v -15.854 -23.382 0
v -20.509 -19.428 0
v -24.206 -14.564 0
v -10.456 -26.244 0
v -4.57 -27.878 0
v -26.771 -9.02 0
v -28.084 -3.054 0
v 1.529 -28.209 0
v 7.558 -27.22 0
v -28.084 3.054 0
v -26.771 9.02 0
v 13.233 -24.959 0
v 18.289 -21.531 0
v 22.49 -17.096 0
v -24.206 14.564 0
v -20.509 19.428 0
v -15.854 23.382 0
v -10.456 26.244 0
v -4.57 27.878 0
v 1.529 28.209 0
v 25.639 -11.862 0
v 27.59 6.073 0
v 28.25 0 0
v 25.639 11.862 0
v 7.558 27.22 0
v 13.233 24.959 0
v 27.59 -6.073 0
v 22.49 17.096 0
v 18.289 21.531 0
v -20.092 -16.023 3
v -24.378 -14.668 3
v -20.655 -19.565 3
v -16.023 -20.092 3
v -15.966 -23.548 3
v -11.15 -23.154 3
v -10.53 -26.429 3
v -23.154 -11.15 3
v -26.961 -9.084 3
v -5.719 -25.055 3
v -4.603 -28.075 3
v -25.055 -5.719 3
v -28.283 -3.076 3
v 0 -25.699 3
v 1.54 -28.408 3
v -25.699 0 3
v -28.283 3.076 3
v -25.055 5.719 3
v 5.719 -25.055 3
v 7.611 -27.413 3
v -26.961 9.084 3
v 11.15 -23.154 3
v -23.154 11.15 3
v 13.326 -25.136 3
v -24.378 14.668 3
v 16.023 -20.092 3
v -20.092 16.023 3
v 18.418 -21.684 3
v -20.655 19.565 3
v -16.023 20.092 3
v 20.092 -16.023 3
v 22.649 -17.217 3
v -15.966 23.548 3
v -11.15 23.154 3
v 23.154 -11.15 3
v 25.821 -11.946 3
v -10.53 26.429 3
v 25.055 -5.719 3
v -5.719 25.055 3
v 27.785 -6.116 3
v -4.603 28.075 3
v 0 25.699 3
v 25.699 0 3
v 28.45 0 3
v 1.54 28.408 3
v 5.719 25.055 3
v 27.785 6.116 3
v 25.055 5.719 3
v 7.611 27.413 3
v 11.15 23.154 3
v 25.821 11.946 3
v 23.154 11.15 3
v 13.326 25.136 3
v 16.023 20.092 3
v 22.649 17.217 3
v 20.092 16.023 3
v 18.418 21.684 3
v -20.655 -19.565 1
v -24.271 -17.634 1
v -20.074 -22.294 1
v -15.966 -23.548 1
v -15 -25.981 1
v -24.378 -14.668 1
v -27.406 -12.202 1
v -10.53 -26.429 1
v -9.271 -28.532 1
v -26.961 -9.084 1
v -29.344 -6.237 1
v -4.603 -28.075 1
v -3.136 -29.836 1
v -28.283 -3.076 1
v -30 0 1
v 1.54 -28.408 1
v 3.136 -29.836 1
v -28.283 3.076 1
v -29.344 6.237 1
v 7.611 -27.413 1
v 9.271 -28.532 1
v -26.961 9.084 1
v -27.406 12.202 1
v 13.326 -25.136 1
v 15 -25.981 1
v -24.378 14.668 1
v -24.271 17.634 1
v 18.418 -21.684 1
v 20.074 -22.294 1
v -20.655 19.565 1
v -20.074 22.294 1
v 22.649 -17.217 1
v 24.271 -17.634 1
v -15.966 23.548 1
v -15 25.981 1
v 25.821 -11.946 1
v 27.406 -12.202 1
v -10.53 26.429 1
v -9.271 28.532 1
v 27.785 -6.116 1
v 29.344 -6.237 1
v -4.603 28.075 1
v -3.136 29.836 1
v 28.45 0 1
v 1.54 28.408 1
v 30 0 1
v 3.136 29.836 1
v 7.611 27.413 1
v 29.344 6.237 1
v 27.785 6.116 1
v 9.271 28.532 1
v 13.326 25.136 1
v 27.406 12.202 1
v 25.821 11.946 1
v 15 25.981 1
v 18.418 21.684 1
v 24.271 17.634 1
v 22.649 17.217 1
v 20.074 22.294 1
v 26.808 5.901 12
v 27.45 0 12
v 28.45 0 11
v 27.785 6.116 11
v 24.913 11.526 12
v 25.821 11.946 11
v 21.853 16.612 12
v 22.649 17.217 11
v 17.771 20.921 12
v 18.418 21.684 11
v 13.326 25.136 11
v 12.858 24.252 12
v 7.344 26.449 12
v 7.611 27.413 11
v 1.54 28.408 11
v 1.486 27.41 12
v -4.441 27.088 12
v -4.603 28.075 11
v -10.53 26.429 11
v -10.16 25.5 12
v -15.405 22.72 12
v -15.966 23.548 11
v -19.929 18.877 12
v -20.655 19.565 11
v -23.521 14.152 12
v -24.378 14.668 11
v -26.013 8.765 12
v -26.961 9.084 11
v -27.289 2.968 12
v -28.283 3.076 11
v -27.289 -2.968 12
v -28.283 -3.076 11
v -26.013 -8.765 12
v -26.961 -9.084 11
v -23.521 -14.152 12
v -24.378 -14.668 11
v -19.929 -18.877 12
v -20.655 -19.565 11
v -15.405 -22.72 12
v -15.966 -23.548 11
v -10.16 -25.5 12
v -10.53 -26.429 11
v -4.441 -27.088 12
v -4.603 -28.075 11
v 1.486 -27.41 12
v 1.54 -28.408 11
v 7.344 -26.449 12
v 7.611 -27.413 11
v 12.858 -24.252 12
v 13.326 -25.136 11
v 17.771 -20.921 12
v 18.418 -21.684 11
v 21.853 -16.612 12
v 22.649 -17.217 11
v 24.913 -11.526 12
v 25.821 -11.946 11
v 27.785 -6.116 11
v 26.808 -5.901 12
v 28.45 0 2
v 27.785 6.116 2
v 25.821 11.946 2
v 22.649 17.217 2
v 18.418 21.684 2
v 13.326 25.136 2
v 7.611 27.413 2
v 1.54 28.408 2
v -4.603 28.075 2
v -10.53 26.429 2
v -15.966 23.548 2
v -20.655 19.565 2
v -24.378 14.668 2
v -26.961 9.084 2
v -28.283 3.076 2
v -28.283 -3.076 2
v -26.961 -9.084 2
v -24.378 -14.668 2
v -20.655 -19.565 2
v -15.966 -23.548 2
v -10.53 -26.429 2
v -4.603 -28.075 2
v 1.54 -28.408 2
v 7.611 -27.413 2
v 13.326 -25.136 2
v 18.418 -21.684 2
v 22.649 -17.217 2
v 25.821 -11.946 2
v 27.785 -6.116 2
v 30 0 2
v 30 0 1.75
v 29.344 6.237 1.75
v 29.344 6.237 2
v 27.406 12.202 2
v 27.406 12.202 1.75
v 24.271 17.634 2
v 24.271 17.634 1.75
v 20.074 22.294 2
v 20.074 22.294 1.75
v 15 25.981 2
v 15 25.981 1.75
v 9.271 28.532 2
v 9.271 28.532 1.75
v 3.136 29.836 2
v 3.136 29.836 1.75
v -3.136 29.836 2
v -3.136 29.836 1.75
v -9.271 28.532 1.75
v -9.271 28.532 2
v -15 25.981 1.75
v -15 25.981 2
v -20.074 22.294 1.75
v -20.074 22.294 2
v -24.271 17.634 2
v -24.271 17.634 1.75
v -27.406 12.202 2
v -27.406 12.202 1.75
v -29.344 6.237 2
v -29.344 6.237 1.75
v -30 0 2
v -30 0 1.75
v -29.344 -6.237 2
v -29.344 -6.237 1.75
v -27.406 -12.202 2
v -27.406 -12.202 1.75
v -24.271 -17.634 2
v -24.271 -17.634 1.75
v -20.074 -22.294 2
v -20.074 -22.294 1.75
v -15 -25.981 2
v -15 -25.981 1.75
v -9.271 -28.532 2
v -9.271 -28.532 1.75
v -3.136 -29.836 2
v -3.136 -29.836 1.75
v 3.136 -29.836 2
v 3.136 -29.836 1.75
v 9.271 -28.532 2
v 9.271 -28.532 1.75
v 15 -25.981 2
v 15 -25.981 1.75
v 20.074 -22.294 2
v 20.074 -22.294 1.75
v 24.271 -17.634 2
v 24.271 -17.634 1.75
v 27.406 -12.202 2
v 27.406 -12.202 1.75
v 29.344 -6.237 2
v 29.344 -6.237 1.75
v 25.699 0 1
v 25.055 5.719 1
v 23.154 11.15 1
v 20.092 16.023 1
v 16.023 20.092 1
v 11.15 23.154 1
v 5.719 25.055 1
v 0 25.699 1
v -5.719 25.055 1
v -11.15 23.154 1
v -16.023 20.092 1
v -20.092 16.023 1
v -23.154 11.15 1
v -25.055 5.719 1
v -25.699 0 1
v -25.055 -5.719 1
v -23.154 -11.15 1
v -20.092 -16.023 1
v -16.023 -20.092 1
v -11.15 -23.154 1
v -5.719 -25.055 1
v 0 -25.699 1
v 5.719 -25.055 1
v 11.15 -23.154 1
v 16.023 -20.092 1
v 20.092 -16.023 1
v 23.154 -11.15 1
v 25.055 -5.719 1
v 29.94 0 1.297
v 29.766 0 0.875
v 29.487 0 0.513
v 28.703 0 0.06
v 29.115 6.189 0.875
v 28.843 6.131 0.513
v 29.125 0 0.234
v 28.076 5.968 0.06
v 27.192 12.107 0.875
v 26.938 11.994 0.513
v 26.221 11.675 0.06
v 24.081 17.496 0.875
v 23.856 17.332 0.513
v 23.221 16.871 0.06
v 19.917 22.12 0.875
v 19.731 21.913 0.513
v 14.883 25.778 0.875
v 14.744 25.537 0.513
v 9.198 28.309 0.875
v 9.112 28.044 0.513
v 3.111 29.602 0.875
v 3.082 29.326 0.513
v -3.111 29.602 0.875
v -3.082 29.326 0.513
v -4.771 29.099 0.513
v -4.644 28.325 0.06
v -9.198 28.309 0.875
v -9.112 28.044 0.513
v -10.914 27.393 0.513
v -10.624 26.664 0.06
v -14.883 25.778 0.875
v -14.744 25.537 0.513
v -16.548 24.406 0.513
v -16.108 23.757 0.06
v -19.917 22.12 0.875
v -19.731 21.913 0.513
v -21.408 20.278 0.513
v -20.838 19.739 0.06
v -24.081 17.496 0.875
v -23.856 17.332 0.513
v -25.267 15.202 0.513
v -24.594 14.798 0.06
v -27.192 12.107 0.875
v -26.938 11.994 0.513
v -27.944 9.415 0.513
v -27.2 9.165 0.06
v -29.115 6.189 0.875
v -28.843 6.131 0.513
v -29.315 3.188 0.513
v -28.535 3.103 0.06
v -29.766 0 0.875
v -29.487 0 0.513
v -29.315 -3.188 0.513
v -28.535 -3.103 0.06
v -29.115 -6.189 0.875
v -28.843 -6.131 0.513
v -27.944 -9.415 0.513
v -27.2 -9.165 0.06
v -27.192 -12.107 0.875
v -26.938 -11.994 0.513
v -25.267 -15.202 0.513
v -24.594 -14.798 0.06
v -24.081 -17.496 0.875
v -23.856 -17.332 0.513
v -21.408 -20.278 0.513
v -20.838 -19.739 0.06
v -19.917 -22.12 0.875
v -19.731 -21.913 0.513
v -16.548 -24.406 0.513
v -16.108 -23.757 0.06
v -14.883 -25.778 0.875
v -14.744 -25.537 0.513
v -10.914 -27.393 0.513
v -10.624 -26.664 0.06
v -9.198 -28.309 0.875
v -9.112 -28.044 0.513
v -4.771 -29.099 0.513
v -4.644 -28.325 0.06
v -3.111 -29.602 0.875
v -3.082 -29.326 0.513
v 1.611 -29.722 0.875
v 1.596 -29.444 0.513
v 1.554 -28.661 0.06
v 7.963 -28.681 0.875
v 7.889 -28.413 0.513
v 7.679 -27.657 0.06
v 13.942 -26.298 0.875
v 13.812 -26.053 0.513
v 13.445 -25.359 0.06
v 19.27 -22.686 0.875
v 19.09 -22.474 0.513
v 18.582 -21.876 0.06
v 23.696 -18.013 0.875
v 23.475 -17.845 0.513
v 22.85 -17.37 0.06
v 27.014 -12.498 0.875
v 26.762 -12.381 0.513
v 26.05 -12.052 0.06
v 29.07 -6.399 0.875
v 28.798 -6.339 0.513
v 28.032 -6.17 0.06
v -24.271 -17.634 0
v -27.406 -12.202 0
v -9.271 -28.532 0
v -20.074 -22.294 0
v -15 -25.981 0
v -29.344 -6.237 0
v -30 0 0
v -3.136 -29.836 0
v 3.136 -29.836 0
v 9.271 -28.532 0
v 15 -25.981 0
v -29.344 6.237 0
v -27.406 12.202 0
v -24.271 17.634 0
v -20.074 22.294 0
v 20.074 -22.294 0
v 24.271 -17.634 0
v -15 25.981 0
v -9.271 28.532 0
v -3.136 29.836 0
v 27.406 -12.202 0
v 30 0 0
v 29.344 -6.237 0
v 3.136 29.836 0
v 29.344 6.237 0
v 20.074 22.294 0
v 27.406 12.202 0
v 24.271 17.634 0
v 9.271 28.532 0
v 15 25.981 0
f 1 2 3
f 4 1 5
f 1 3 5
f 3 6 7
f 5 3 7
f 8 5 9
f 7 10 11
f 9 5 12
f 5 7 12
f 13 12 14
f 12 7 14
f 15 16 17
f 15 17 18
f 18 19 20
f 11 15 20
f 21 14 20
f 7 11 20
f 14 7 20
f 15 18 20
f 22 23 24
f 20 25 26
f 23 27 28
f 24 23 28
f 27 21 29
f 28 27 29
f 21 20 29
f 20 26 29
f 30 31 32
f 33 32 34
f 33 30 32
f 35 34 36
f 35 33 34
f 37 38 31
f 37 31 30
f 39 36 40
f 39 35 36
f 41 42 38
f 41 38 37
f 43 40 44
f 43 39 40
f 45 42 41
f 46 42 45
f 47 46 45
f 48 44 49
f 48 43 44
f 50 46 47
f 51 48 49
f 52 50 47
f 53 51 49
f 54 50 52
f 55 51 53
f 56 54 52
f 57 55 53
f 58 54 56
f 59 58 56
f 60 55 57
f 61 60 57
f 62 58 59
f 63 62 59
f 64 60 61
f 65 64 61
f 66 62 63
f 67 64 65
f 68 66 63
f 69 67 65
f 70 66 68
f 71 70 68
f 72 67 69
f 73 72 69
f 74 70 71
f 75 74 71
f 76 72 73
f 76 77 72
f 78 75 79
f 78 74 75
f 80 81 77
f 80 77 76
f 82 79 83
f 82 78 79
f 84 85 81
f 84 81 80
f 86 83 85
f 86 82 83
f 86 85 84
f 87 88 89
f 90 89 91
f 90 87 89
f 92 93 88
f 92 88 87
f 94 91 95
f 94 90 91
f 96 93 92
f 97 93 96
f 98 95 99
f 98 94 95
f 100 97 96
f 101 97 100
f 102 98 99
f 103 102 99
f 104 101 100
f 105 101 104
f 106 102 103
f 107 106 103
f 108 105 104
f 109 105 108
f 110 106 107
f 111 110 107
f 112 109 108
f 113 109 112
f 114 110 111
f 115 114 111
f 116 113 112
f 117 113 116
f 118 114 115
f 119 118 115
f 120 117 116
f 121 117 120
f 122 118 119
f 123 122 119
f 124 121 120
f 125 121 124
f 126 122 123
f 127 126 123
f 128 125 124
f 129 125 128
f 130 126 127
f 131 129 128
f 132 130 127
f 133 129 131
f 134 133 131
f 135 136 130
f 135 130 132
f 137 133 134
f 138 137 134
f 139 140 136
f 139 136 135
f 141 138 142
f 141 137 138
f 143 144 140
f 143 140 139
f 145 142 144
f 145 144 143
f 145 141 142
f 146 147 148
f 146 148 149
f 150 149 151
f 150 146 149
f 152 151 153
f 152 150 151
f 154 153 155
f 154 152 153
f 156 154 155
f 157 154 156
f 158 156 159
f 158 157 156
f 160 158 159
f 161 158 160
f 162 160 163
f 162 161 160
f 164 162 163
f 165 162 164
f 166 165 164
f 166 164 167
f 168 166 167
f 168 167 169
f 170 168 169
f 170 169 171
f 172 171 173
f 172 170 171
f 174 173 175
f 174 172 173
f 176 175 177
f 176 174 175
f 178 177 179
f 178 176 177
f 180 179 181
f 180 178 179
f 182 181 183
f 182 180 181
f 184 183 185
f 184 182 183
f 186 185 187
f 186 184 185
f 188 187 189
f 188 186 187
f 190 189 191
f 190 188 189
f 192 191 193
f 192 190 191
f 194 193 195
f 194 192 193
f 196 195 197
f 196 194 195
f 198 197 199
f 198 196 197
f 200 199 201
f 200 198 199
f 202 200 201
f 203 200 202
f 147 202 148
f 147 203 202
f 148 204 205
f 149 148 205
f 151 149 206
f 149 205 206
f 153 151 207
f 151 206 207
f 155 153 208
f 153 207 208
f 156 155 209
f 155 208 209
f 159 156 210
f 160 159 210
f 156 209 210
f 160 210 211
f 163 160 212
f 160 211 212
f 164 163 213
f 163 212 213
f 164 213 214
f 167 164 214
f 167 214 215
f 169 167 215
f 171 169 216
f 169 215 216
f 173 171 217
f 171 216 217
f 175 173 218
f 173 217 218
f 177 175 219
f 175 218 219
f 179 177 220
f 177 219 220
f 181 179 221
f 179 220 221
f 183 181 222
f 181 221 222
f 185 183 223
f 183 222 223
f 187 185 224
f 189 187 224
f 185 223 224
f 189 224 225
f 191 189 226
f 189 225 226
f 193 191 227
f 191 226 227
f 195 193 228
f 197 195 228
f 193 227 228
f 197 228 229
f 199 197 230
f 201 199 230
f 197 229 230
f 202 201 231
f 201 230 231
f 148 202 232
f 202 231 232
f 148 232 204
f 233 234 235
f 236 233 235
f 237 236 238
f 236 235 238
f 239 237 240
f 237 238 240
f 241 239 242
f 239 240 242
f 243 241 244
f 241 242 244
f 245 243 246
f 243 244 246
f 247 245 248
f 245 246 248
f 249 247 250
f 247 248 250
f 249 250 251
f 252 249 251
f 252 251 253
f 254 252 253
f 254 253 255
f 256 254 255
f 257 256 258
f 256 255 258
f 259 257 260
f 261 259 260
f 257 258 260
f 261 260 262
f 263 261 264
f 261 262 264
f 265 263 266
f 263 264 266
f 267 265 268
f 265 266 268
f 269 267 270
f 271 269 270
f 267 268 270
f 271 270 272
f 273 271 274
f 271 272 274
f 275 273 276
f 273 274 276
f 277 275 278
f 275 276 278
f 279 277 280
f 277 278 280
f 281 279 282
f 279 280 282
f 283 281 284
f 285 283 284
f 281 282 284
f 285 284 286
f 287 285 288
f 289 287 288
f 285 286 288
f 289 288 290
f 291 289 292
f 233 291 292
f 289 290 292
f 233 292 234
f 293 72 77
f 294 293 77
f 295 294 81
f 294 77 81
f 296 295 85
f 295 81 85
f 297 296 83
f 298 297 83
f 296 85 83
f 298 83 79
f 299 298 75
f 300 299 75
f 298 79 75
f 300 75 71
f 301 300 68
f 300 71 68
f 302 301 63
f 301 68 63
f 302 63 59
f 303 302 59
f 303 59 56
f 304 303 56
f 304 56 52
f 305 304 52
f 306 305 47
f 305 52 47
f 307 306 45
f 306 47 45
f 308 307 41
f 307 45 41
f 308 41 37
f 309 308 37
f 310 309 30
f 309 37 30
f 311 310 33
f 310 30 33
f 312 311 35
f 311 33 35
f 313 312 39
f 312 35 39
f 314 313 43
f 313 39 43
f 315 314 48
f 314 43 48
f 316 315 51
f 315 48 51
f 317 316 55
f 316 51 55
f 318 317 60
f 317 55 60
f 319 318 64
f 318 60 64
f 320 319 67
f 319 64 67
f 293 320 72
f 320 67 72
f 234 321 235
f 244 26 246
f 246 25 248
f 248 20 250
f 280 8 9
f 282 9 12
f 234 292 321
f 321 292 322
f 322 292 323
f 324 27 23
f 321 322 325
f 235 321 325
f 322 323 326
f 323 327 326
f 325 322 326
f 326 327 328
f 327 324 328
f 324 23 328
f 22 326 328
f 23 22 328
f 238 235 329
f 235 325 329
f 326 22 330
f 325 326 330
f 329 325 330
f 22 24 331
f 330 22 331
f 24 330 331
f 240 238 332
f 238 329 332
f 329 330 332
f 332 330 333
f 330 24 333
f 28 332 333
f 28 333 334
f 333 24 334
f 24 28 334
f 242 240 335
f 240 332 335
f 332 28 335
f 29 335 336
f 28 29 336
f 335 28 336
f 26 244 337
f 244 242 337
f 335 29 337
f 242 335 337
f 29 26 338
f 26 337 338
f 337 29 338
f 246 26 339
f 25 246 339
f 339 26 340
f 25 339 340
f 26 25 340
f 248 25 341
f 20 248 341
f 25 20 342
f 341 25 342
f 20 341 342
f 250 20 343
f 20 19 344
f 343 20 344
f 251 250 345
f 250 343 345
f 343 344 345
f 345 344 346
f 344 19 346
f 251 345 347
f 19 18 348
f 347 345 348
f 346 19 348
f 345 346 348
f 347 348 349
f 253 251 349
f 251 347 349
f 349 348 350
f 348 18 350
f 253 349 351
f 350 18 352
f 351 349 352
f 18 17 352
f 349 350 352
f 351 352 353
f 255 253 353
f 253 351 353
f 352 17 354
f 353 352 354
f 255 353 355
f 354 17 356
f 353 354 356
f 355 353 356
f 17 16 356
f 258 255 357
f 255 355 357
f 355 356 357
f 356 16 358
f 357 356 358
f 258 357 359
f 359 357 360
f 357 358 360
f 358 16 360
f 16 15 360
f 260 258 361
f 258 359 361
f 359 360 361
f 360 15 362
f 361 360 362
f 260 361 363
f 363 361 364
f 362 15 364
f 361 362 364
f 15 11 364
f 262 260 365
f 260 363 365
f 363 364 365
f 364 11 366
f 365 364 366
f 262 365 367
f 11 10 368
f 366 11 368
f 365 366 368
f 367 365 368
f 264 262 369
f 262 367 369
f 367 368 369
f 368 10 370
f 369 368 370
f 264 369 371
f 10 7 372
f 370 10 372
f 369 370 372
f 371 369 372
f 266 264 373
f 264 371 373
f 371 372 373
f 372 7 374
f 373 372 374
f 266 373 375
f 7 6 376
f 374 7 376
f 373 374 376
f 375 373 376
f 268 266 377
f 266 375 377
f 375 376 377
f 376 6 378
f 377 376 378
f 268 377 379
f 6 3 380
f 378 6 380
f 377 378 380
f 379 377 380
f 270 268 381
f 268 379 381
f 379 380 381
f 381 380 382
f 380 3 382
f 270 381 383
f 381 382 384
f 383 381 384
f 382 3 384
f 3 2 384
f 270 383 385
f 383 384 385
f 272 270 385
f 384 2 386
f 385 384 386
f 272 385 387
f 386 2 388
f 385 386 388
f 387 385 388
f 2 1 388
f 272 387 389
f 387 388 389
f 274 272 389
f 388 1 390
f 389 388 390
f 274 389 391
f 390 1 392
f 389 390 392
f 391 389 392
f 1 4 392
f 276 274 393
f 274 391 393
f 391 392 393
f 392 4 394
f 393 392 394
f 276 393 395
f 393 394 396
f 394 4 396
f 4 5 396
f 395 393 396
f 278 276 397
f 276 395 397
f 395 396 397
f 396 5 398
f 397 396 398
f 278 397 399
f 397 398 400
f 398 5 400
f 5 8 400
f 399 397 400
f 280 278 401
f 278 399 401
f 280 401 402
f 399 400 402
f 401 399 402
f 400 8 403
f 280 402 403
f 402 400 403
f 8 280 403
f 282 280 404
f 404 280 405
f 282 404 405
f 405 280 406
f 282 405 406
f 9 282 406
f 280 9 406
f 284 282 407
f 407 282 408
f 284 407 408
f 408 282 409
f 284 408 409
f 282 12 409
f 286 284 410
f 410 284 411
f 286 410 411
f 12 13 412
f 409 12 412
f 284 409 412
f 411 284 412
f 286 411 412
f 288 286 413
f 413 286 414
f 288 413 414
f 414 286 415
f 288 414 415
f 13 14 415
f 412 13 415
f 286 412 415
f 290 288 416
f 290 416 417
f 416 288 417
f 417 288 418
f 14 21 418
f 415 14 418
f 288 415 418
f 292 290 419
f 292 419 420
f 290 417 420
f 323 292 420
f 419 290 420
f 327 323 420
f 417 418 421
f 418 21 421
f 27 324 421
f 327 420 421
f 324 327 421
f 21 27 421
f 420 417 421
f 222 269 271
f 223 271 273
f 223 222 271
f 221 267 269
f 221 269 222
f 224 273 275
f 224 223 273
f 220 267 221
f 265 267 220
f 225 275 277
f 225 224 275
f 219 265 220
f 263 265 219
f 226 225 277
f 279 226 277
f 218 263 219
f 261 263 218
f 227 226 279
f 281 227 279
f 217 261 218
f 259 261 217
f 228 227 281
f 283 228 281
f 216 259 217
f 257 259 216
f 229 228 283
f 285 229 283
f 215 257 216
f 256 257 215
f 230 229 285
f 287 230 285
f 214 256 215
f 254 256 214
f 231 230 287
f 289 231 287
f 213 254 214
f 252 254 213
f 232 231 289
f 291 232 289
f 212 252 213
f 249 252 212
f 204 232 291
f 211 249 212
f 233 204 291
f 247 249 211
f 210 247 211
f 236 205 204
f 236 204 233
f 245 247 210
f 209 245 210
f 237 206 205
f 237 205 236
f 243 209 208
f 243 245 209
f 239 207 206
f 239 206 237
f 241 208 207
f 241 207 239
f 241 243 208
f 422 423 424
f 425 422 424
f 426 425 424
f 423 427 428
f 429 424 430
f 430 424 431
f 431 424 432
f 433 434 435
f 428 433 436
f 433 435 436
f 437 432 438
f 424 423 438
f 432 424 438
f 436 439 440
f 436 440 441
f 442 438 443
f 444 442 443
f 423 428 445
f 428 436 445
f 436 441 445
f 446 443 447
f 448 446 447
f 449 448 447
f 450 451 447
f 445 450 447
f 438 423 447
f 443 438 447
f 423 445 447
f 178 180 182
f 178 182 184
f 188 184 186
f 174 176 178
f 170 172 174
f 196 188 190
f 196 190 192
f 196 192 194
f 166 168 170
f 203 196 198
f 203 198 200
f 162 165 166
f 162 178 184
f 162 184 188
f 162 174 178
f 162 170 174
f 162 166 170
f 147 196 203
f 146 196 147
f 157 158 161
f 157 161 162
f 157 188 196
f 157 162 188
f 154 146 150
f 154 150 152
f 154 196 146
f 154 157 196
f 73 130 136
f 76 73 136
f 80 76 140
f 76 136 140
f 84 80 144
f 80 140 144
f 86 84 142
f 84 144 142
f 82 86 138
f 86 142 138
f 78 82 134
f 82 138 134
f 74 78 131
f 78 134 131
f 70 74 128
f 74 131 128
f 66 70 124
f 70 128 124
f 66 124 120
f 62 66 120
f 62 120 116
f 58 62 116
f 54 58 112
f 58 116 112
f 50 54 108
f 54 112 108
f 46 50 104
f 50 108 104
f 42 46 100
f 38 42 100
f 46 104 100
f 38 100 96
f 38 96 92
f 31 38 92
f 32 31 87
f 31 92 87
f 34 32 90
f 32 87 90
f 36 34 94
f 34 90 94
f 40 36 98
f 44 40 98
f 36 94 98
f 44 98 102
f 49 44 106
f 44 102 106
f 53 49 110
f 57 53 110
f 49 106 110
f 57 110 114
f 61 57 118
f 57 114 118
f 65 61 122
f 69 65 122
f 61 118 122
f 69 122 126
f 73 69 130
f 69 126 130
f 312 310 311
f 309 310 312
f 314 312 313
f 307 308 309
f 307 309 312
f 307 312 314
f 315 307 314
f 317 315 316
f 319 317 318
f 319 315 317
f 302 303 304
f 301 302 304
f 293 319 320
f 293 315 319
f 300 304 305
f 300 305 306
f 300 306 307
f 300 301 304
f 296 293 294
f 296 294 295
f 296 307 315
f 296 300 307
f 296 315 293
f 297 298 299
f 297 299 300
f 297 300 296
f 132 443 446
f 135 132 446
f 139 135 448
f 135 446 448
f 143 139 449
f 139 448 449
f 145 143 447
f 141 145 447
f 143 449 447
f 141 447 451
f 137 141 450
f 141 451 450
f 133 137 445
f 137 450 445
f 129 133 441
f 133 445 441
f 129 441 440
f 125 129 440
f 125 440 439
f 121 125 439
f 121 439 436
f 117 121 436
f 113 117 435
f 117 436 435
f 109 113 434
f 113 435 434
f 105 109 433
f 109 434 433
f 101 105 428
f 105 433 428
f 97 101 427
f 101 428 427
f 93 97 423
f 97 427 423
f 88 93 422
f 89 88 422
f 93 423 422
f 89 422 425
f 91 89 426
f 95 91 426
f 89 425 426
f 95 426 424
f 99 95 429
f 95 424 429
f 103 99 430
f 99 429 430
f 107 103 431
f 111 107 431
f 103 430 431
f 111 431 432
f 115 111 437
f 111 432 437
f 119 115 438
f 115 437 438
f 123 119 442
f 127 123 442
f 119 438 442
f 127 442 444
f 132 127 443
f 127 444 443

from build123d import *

# Parameters (mm, degrees)
SKETCH_R     = 30
PAD_DEPTH    = 2
SKETCH001_R  = 28.45
PAD001_DEPTH = 10
FILLET_R     = 1.75
CHAMFER_SIZE = 1
SKETCH002_R  = 30
PAD002_DEPTH = 1
SKETCH003_R  = 28.45
PAD003_DEPTH = 2
SKETCH004_R  = 25.699006
POCKET_DEPTH = 2


with BuildPart() as body:
    # Sketch → Pad (new body)
    with BuildSketch(Plane.XY):
        Circle(SKETCH_R)
    extrude(amount=PAD_DEPTH)

    # Sketch001 (on Face3 of Pad) → Pad001 (join)
    with BuildSketch(Plane.XY.offset(2)):
        Circle(SKETCH001_R)
    extrude(amount=PAD001_DEPTH)

    # Fillet
    fillet_edges = [body.edges().sort_by_distance(p)[0] for p in [
        (-30, 0, 0),
    ]]
    fillet(fillet_edges, radius=FILLET_R)

    # Chamfer
    chamfer_edges = [body.edges().sort_by_distance(p)[0] for p in [
        (-28.45, 0, 12),
    ]]
    chamfer(chamfer_edges, length=CHAMFER_SIZE)


with BuildPart() as body001:
    # Sketch002 → Pad002 (new body)
    with BuildSketch(Plane.XY):
        Circle(SKETCH002_R)
    extrude(amount=PAD002_DEPTH)

    # Sketch003 (on Face3 of Pad002) → Pad003 (join)
    with BuildSketch(Plane.XY.offset(1)):
        Circle(SKETCH003_R)
    extrude(amount=PAD003_DEPTH)

    # Sketch004 (on Face5 of Pad003) → Pocket (cut)
    with BuildSketch(Plane.XY.offset(3)):
        Circle(SKETCH004_R)
    extrude(amount=-POCKET_DEPTH, mode=Mode.SUBTRACT)


solid = Compound([body.part, body001.part])
